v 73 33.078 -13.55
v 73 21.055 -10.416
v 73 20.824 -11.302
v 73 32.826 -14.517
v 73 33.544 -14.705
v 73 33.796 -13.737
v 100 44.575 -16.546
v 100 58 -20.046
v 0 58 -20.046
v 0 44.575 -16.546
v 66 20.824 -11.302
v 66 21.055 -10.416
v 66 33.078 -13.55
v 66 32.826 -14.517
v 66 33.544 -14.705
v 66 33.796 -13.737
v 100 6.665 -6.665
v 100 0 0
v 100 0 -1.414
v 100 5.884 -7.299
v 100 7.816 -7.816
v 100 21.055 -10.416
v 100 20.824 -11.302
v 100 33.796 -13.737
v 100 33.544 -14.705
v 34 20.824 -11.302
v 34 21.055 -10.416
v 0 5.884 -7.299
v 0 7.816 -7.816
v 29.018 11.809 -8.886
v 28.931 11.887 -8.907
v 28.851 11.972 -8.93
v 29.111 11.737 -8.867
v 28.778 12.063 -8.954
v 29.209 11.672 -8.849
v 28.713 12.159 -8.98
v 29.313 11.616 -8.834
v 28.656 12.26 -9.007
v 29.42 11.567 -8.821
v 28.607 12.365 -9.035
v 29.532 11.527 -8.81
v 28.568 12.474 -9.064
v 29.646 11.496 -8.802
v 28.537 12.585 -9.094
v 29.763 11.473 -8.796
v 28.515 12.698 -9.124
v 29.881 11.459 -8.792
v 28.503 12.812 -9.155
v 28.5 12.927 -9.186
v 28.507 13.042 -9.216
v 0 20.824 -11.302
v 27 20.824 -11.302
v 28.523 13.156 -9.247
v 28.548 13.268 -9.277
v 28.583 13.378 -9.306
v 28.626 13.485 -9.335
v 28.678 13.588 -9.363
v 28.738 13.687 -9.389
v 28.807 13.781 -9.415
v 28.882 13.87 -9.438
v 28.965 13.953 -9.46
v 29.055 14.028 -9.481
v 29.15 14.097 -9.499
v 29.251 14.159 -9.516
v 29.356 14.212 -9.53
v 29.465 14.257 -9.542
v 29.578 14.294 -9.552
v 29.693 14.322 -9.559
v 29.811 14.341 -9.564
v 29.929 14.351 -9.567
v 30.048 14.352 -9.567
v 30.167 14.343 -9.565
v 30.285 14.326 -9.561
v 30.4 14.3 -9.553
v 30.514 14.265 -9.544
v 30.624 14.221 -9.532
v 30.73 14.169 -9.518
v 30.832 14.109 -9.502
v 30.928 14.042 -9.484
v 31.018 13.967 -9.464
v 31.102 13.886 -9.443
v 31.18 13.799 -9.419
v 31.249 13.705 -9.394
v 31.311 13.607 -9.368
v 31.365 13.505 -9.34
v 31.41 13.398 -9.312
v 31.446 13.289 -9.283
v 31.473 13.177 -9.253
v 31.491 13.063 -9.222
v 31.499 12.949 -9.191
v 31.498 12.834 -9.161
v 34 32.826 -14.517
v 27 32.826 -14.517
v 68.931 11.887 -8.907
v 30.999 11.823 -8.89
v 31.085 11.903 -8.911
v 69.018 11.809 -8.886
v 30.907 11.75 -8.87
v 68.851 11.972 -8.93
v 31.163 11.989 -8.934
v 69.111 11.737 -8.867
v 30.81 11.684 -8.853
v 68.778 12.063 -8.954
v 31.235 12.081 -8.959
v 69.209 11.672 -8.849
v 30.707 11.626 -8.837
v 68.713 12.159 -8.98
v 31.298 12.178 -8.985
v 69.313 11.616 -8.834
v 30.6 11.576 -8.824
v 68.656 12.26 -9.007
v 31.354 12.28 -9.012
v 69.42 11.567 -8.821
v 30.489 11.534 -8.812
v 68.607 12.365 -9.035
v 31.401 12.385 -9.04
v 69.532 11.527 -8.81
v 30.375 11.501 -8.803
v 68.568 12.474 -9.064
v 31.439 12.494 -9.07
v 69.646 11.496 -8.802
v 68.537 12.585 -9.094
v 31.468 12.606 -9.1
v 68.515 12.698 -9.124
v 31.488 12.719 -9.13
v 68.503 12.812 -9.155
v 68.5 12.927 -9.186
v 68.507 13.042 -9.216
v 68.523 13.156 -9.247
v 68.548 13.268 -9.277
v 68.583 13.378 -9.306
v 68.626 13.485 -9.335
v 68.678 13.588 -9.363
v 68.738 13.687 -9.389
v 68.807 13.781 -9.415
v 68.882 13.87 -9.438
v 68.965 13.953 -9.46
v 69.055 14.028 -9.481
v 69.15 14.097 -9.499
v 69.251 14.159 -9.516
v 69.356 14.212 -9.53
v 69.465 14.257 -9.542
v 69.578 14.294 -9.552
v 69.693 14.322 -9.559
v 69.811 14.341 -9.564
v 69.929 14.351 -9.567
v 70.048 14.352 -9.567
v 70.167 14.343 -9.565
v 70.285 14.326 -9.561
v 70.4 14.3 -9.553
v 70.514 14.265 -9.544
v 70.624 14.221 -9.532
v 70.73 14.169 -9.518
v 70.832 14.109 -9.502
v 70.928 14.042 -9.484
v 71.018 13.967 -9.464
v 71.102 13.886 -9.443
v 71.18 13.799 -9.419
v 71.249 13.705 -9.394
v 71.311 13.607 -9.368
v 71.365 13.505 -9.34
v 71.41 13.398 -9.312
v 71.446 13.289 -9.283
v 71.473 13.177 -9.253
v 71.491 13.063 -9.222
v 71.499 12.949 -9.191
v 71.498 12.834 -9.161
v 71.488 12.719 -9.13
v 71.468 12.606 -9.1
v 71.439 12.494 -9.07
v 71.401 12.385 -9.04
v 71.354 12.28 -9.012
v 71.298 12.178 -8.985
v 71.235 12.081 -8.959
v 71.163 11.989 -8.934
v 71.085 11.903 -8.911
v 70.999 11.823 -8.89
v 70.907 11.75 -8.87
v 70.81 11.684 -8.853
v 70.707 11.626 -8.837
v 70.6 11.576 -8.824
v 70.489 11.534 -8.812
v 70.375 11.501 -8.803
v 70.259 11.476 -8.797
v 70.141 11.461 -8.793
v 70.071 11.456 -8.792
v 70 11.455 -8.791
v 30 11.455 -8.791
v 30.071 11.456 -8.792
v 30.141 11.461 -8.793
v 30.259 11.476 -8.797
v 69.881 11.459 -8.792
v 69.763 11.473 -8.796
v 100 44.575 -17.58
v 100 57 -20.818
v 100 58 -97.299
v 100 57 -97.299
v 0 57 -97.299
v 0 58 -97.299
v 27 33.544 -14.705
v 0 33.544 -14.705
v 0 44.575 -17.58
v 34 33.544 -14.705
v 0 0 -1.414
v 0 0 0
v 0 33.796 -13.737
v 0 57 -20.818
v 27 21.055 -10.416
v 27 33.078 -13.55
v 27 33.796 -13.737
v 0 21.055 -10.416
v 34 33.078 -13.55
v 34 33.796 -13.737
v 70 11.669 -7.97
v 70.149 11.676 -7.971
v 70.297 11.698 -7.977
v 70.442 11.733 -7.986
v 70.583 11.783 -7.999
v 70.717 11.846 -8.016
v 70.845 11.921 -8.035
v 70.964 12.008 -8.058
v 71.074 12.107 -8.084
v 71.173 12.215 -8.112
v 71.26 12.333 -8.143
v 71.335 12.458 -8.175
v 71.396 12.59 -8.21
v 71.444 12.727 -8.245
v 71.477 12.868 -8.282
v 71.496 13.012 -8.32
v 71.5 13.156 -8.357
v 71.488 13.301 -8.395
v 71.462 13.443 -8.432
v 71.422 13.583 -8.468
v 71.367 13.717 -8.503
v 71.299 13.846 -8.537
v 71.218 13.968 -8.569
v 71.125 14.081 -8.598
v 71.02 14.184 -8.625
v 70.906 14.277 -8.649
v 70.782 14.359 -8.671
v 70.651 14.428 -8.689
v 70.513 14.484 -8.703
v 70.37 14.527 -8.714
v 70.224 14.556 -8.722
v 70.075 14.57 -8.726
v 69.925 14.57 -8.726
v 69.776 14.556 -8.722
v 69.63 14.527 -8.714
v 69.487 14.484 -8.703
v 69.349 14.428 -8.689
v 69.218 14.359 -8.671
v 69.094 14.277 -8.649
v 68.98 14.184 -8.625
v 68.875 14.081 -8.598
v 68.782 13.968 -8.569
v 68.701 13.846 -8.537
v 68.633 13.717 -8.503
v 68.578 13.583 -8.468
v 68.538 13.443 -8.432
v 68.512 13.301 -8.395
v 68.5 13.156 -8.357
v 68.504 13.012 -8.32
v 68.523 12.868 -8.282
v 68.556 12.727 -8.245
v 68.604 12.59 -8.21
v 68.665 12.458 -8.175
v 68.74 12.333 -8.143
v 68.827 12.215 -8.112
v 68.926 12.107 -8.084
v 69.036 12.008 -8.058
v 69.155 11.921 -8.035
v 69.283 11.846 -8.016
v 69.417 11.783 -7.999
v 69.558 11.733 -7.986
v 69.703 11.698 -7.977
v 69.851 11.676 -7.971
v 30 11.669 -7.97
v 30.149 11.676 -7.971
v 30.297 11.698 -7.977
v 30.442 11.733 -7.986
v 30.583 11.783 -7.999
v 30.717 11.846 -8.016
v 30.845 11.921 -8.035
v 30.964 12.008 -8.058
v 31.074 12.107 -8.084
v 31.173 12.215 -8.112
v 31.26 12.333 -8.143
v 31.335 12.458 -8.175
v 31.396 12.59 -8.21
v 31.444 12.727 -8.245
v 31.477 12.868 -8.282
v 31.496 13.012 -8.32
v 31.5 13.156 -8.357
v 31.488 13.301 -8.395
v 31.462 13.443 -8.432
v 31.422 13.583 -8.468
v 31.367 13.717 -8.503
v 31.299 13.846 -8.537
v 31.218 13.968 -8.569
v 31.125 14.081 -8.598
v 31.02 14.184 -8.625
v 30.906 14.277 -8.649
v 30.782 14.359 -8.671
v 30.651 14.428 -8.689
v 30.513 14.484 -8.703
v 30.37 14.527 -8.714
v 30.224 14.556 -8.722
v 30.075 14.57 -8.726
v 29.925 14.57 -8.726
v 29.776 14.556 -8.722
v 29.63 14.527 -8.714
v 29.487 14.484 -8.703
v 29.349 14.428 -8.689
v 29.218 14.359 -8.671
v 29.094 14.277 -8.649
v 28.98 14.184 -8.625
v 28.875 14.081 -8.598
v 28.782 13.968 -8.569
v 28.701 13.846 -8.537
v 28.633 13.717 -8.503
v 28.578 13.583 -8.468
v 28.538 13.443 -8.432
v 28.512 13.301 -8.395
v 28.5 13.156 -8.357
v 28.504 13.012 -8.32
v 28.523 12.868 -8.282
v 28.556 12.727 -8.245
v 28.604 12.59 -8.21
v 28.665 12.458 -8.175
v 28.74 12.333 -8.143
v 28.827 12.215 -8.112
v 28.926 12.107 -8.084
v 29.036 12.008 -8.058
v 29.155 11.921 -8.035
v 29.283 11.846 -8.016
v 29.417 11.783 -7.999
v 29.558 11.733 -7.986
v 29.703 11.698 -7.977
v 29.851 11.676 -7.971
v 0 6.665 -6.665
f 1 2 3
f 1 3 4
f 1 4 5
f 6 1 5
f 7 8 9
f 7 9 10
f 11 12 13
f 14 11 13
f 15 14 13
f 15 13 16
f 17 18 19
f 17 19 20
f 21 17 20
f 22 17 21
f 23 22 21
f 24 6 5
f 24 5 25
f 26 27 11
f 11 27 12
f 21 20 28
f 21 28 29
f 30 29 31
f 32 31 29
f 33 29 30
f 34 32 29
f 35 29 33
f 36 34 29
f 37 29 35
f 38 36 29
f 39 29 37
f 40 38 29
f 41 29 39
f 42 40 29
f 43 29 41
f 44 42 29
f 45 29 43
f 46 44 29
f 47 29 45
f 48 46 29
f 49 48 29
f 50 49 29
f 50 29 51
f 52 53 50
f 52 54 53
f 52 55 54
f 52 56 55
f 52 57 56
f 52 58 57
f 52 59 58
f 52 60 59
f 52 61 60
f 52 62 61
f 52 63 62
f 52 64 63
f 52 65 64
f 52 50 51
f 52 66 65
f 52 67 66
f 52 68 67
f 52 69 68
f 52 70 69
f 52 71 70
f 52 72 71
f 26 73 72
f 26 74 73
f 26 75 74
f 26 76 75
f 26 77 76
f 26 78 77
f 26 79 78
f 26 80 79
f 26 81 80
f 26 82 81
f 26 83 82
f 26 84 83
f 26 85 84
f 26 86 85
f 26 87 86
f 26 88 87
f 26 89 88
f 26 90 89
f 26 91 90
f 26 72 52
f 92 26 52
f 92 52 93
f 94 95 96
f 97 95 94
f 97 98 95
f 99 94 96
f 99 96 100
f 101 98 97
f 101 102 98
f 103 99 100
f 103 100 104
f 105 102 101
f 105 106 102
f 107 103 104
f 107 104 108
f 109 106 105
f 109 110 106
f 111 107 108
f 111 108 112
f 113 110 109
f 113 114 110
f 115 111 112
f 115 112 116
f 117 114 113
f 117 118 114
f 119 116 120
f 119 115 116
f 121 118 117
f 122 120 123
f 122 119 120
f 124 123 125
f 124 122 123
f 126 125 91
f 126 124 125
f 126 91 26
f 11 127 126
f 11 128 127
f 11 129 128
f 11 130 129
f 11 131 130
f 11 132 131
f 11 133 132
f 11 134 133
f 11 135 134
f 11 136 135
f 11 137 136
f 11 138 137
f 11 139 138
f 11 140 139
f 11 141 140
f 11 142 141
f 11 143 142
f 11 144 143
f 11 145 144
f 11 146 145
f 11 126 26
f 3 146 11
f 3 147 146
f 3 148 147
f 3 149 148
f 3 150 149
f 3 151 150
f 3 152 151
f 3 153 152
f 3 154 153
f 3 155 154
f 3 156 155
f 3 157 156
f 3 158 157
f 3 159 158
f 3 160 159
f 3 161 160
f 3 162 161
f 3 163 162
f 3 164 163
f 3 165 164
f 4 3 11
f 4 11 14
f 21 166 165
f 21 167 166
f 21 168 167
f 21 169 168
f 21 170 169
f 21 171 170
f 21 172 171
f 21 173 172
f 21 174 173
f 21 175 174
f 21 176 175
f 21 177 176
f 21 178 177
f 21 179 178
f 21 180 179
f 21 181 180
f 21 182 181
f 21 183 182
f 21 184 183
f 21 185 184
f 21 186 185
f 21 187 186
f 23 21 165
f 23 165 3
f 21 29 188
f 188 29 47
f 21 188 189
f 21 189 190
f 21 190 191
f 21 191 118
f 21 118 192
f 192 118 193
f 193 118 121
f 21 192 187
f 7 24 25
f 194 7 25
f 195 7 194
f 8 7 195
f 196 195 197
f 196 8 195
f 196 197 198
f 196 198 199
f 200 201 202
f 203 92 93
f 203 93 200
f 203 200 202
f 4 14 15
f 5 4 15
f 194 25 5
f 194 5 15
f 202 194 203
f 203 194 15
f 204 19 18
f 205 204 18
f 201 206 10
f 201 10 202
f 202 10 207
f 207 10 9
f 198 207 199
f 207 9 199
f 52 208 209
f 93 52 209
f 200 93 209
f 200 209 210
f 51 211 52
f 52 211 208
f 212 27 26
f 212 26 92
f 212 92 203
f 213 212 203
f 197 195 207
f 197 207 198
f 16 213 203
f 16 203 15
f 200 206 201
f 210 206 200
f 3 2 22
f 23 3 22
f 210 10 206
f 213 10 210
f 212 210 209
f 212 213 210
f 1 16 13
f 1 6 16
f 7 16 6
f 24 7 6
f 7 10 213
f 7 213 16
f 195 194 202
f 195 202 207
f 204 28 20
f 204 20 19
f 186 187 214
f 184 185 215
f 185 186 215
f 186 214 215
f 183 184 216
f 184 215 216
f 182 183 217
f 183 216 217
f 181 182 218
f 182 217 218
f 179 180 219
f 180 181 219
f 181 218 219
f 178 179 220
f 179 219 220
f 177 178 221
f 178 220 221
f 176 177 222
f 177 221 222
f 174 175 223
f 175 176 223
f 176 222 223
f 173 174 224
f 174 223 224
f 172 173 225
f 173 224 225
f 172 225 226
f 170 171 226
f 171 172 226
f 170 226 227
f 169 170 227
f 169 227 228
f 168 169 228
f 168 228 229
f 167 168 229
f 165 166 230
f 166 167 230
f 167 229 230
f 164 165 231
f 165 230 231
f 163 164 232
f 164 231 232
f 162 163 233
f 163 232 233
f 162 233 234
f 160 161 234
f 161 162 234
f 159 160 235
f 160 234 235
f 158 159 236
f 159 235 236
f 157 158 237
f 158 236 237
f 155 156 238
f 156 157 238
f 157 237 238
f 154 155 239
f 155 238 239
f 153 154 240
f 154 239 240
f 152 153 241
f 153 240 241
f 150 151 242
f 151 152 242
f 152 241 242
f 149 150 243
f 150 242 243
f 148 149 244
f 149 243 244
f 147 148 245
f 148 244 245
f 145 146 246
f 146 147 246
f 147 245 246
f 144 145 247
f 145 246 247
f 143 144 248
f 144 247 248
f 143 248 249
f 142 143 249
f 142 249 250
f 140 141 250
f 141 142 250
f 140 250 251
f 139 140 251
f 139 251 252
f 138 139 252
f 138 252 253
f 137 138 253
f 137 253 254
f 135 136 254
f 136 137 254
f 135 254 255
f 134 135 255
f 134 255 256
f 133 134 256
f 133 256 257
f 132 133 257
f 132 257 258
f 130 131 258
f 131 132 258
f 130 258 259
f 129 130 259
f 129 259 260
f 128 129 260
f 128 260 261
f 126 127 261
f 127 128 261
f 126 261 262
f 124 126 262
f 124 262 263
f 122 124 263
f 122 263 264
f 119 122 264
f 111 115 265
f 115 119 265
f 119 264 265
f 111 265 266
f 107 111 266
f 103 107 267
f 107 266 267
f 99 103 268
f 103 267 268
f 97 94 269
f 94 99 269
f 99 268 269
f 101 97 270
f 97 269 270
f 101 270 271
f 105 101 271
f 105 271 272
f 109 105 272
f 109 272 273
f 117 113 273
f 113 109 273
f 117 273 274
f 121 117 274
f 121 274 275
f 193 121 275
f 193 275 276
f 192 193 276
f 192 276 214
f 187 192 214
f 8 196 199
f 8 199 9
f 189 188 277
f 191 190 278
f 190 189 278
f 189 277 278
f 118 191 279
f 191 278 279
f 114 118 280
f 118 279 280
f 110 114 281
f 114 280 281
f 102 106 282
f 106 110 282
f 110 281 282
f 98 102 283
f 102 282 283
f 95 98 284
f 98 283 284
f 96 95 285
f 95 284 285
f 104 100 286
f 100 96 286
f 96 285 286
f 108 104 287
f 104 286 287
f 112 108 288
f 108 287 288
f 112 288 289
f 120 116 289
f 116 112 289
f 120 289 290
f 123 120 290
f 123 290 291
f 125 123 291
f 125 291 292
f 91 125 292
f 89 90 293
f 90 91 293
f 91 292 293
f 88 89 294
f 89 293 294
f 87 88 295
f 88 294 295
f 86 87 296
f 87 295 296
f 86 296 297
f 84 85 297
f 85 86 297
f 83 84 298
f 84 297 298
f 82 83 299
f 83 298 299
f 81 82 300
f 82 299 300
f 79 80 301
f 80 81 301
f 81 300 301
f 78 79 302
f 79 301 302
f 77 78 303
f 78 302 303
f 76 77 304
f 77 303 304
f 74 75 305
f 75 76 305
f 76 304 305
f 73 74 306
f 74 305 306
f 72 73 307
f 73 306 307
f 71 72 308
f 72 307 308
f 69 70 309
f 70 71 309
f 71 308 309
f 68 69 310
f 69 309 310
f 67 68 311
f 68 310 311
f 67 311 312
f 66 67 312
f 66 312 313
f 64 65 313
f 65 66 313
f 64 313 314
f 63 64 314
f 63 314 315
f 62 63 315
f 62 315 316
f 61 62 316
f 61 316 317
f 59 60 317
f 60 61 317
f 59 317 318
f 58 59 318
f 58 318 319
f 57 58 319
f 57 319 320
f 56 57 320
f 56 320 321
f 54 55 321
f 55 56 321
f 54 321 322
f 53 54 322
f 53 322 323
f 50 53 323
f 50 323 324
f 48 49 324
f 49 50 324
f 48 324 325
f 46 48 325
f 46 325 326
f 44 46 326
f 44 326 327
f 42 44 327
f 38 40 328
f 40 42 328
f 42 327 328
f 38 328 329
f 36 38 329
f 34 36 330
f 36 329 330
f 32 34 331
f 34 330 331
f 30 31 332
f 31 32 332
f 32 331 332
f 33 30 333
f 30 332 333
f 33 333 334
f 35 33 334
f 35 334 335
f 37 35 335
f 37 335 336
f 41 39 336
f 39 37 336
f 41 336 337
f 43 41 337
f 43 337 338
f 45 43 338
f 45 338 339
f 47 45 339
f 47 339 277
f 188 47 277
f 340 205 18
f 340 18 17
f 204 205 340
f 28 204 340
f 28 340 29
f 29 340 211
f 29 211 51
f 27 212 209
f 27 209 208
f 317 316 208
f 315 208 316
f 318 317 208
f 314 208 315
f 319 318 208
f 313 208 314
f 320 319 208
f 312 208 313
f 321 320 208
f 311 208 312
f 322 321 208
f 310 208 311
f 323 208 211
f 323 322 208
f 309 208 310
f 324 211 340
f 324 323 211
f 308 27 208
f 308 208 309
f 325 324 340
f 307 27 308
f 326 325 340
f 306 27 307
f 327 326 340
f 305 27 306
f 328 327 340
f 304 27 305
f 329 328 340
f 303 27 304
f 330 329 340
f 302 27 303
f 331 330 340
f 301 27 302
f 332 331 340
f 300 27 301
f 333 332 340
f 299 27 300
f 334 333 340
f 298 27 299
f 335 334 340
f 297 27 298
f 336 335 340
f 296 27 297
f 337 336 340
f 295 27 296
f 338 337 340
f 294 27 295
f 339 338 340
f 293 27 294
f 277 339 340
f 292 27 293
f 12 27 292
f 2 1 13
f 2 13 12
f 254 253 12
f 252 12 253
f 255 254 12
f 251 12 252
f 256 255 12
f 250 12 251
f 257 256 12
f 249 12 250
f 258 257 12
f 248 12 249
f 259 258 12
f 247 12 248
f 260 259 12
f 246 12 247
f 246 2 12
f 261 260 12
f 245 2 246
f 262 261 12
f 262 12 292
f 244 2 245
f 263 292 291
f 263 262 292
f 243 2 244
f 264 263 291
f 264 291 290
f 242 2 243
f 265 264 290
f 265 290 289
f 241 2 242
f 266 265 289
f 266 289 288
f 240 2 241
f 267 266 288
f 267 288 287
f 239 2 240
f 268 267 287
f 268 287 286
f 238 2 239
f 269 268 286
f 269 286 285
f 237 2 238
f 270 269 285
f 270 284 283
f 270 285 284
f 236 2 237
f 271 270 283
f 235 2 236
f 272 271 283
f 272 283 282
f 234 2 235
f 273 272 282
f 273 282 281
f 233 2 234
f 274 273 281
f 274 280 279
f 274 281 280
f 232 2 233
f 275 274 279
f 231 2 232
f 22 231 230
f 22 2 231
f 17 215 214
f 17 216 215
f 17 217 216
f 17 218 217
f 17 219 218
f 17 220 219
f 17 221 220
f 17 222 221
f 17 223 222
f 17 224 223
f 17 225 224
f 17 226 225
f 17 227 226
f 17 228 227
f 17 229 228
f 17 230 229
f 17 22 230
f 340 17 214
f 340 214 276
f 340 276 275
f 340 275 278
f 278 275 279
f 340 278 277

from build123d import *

# Parameters (mm, degrees)
RESSALTO_EXTRUS_O1_DEPTH = 100
RESSALTO_EXTRUS_O2_DEPTH = 100
CORTE_EXTRUS_O1_DEPTH    = 100
RESSALTO_EXTRUS_O3_DEPTH = 100
ESBO_O20_R               = 1.5
CORTE_EXTRUS_O6_DEPTH    = 5
ESBO_O24_W               = 27
ESBO_O24_H               = 13.16698281
ESBO_O24_W_2             = 32
CORTE_EXTRUS_O7_DEPTH    = 115.152987189
CORTE_EXTRUS_O8_DEPTH    = 115.291627571
RESSALTO_EXTRUS_O4_DEPTH = 100


with BuildPart() as part:
    # Esboço1 → Ressalto-extrusão1 (new body)
    with BuildSketch(Plane(origin=(0, 0, 0), x_dir=(0, 0, -1), z_dir=(1, 0, 0))):
        Polygon((0, 0), (9.292893219, 9.292893219), (15.968885233, 32.111148665), (16.934326675, 31.850528592), (10, 8.585786438), (1.414213562, 0), align=None)
    extrude(amount=RESSALTO_EXTRUS_O1_DEPTH)

    # Esboço2 → Ressalto-extrusão2 (add)
    with BuildSketch(Plane(origin=(100, 0, 0), x_dir=(0, 0, -1), z_dir=(1, 0, 0))):
        Polygon((7.816147842, 7.816147842), (14.517472223, 32.825830908), (13.549802648, 33.078052229), (6.665390157, 6.665390157), align=None)
    extrude(amount=-RESSALTO_EXTRUS_O2_DEPTH)

    # Esboço3 → Corte-extrusão1 (cut)
    with BuildSketch(Plane(origin=(100, 0, 0), x_dir=(0, 0, -1), z_dir=(1, 0, 0))):
        Polygon((7.298509752, 5.88429619), (7.816147842, 7.816147842), (9.292893219, 9.292893219), (15.968885233, 32.111148665), (16.934326675, 31.850528592), (10, 8.585786438), align=None)
    extrude(amount=-CORTE_EXTRUS_O1_DEPTH, mode=Mode.SUBTRACT)

    # Esboço4 → Ressalto-extrusão3 (add)
    with BuildSketch(Plane(origin=(100, 0, 0), x_dir=(0, 0, -1), z_dir=(1, 0, 0))):
        Polygon((13.549802648, 33.078052229), (14.517472223, 32.825830908), (19.404372889, 51.574860843), (18.436703315, 51.827082163), align=None)
    extrude(amount=-RESSALTO_EXTRUS_O3_DEPTH)

    # Esboço20 → Corte-extrusão6 (cut)
    with BuildSketch(Plane(origin=(0, -1.202778341, -4.614566301), x_dir=(1, 0, 0), z_dir=(0, 0.25222132052248, 0.9676695745314599))):
        with Locations(Location((30, 14.801620202, 0), (0, 0, 270))):
            Circle(ESBO_O20_R)
        with Locations(Location((70, 14.801620202, 0), (0, 0, 270))):
            Circle(ESBO_O20_R)
    extrude(amount=-CORTE_EXTRUS_O6_DEPTH, mode=Mode.SUBTRACT)

    # Esboço24 → Corte-extrusão7 (cut, through all)
    with BuildSketch(Plane(origin=(0, -1.202778341, -4.614566301), x_dir=(1, 0, 0), z_dir=(0, 0.25222132052248, 0.9676695745314599))):
        with Locations((13.5, 29.585111607)):
            Rectangle(ESBO_O24_W, ESBO_O24_H)
        with Locations((86.5, 29.585111607)):
            Rectangle(ESBO_O24_W, ESBO_O24_H)
        with Locations((50, 29.585111607)):
            Rectangle(ESBO_O24_W_2, ESBO_O24_H)
    extrude(amount=-CORTE_EXTRUS_O7_DEPTH, mode=Mode.SUBTRACT)

    # Esboço25 → Corte-extrusão8 (cut, through all)
    with BuildSketch(Plane(origin=(100, 0, 0), x_dir=(0, 0, -1), z_dir=(1, 0, 0))):
        Polygon((17.579835578, 44.574860843), (10.547206245, 44.574860843), (18.436703315, 51.827082163), (19.404372889, 51.574860843), align=None)
    extrude(amount=-CORTE_EXTRUS_O8_DEPTH, mode=Mode.SUBTRACT)

    # Esboço26 → Ressalto-extrusão4 (add)
    with BuildSketch(Plane(origin=(100, 0, 0), x_dir=(0, 0, -1), z_dir=(1, 0, 0))):
        Polygon((16.546424974, 44.574860843), (17.579835578, 44.574860843), (20.818425576, 57), (63.298509752, 57), (97.298509752, 57), (97.298509752, 58), (63.298509752, 58), (20.045663159, 58), align=None)
    extrude(amount=-RESSALTO_EXTRUS_O4_DEPTH)


solid = part.part
